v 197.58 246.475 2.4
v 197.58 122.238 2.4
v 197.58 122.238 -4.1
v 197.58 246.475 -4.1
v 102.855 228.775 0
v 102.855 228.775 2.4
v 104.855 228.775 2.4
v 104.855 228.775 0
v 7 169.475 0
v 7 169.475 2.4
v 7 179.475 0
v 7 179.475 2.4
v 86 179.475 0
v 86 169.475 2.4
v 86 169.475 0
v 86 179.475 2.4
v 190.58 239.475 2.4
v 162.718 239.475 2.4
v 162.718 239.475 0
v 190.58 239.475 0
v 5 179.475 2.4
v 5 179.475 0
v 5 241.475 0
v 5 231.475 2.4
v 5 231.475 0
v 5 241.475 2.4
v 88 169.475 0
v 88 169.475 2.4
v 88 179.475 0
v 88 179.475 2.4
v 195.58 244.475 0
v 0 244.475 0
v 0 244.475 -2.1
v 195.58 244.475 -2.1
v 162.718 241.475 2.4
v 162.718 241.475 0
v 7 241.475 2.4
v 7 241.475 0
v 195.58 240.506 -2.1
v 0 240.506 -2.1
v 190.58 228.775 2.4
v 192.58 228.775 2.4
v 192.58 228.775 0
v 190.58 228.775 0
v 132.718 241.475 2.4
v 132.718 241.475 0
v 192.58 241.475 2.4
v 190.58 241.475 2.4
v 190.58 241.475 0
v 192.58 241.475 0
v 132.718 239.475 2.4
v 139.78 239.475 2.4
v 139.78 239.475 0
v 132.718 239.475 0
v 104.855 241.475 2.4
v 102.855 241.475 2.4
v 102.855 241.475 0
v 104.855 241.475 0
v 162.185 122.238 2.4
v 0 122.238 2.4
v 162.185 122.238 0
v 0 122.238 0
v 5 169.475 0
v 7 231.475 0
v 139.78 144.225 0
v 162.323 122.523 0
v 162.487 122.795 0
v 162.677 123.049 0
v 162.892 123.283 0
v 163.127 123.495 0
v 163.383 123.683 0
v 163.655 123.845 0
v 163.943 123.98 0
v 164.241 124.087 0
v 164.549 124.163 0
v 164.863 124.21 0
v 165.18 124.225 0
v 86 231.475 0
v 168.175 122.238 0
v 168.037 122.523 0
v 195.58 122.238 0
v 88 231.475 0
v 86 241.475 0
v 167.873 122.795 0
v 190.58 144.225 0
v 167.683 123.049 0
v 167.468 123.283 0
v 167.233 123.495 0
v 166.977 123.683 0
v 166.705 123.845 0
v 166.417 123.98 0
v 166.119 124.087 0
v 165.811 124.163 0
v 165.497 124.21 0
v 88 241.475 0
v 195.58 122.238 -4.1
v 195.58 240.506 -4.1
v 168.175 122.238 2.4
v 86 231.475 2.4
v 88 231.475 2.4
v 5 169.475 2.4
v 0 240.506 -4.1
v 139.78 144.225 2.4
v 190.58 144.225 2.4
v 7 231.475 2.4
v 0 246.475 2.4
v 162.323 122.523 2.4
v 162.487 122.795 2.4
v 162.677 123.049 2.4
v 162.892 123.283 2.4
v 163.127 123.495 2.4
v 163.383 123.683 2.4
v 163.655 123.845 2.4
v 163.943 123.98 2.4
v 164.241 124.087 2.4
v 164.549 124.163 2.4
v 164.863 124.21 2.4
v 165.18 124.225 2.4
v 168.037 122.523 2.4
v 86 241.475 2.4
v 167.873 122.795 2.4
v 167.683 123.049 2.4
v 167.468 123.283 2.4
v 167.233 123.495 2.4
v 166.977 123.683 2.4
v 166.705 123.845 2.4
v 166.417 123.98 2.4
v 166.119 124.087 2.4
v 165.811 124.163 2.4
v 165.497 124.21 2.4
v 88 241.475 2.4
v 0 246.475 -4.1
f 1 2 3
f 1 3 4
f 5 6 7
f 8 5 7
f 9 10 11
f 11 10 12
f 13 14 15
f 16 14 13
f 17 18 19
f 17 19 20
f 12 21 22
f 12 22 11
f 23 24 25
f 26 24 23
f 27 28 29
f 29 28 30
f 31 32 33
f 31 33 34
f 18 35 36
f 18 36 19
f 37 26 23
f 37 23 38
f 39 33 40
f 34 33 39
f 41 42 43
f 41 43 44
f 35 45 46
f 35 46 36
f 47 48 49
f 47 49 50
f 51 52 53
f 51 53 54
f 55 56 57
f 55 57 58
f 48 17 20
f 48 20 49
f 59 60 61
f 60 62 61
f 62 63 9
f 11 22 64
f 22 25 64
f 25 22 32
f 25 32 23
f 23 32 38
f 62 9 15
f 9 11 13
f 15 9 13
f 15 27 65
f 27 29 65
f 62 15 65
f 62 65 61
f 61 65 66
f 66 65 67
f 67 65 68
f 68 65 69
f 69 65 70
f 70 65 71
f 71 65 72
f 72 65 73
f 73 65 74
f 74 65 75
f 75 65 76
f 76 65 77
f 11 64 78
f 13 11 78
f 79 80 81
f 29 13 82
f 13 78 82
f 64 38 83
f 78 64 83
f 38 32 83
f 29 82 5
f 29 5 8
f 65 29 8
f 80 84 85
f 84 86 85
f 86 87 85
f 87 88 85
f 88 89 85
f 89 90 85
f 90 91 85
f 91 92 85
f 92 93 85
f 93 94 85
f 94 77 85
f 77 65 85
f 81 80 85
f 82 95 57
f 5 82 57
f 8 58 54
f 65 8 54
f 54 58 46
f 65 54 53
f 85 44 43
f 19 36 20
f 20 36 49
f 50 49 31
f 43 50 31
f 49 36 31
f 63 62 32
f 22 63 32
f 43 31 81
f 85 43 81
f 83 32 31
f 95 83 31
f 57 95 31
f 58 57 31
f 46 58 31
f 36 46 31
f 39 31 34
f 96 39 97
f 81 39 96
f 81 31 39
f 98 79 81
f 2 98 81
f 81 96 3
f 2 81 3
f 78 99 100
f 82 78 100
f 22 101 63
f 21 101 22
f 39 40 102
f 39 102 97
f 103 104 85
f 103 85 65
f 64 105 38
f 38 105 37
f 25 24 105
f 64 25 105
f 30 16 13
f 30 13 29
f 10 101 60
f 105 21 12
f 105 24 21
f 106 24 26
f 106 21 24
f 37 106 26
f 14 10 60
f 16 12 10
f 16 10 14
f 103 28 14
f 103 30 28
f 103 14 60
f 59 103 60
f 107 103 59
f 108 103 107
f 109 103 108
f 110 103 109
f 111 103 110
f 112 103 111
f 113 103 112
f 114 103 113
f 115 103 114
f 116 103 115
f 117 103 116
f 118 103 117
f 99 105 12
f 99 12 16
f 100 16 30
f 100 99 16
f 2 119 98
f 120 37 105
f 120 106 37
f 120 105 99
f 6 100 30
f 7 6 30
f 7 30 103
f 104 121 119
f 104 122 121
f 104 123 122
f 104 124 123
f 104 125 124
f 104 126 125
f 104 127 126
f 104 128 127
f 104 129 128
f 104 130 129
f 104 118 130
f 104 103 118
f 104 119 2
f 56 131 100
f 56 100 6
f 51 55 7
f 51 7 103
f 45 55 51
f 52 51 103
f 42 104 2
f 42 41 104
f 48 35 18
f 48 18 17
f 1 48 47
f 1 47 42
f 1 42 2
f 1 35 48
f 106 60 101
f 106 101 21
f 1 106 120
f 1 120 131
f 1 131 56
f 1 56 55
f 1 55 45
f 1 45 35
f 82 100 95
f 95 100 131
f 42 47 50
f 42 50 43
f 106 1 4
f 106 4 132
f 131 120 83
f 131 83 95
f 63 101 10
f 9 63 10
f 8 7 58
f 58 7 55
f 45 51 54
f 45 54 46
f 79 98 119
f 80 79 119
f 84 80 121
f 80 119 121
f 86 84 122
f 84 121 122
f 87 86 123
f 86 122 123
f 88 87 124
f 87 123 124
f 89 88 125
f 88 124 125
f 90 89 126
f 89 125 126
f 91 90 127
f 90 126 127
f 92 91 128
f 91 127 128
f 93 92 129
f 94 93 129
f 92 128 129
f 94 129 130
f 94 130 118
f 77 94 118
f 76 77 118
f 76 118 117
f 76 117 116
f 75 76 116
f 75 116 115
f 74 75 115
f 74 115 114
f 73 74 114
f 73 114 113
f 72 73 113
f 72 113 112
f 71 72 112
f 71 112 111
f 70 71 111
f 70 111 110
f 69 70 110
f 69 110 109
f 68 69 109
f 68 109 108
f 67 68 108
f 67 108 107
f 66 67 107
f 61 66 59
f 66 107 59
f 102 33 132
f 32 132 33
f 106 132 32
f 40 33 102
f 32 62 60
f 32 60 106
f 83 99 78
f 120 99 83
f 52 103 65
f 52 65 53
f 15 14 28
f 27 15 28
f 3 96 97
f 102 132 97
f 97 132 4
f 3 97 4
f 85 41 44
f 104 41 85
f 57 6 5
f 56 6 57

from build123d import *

# Parameters (mm, degrees)
SKETCH1_W           = 195.58
SKETCH1_H           = 244.475
BOSS_EXTRUDE1_DEPTH = 2.4
BOSS_EXTRUDE2_DEPTH = 4.5
BOSS_EXTRUDE3_DEPTH = 2
SKETCH4_W           = 2
SKETCH4_H           = 10
CUT_EXTRUDE1_DEPTH  = 2.4
SKETCH5_W           = 2
SKETCH5_H           = 12.7
CUT_EXTRUDE2_DEPTH  = 2.4
SKETCH6_R           = 3.25
CUT_EXTRUDE3_DEPTH  = 316.95890876
SKETCH7_W           = 248.705965207
SKETCH7_H           = 26.677752725
CUT_EXTRUDE4_DEPTH  = 234.430124033


with BuildPart() as part:
    # Sketch1 → Boss-Extrude1 (new body)
    with BuildSketch(Plane.XY):
        with Locations((97.79, 122.2375)):
            Rectangle(SKETCH1_W, SKETCH1_H)
    extrude(amount=BOSS_EXTRUDE1_DEPTH)

    # Sketch2 → Boss-Extrude2 (add)
    with BuildSketch(Plane.XY.offset(2.4)):
        Polygon((195.58, 0), (0, 0), (0, -2), (196.923366415, -2), (197.58, -2), (197.58, 246.475), (195.58, 246.475), (0, 246.475), (0, 244.475), (195.58, 244.475), align=None)
    extrude(amount=-BOSS_EXTRUDE2_DEPTH)

    # Sketch3 → Boss-Extrude3 (add)
    with BuildSketch(Plane(origin=(0, 0, -2.1), x_dir=(-1, 0, 0), z_dir=(0, 0, -1))):
        Polygon((0, -2), (-197.58, -2), (-197.58, 246.475), (0, 246.475), (0, 240.50625), (-195.58, 240.50625), (-195.58, 3.96875), (0, 3.96875), align=None)
    extrude(amount=BOSS_EXTRUDE3_DEPTH)

    # Sketch4 → Cut-Extrude1 (cut)
    with BuildSketch(Plane.XY.offset(2.4)):
        with Locations((6, 236.475)):
            Rectangle(SKETCH4_W, SKETCH4_H)
        with Locations((6, 174.475)):
            Rectangle(SKETCH4_W, SKETCH4_H)
        with Locations((87, 174.475)):
            Rectangle(SKETCH4_W, SKETCH4_H)
        with Locations((87, 236.475)):
            Rectangle(SKETCH4_W, SKETCH4_H)
    extrude(amount=-CUT_EXTRUDE1_DEPTH, mode=Mode.SUBTRACT)

    # Sketch5 → Cut-Extrude2 (cut)
    with BuildSketch(Plane.XY.offset(2.4)):
        Polygon((162.7175, 239.475), (190.58, 239.475), (190.58, 241.475), (192.58, 241.475), (192.58, 228.775), (190.58, 228.775), (190.58, 144.225), (139.78, 144.225), (139.78, 239.475), (132.7175, 239.475), (132.7175, 241.475), (162.7175, 241.475), align=None)
        with Locations((103.855, 235.125)):
            Rectangle(SKETCH5_W, SKETCH5_H)
    extrude(amount=-CUT_EXTRUDE2_DEPTH, mode=Mode.SUBTRACT)

    # Sketch6 → Cut-Extrude3 (cut, through all)
    with BuildSketch(Plane.XY.offset(2.4)):
        with Locations((165.18, 120.975)):
            Circle(SKETCH6_R)
        with Locations((165.18, 100.975)):
            Circle(SKETCH6_R)
        with Locations((165.18, 80.975)):
            Circle(SKETCH6_R)
        with Locations((165.18, 60.975)):
            Circle(SKETCH6_R)
        with Locations((165.18, 40.975)):
            Circle(SKETCH6_R)
    extrude(amount=-CUT_EXTRUDE3_DEPTH, mode=Mode.SUBTRACT)

    # Sketch7 → Cut-Extrude4 (cut, through all)
    with BuildSketch(Plane(origin=(0, 122.2375, 0), x_dir=(1, 0, 0), z_dir=(0, 1, 0))):
        with Locations((112.749873787, 1.388723817)):
            Rectangle(SKETCH7_W, SKETCH7_H)
    extrude(amount=-CUT_EXTRUDE4_DEPTH, mode=Mode.SUBTRACT)


solid = part.part
